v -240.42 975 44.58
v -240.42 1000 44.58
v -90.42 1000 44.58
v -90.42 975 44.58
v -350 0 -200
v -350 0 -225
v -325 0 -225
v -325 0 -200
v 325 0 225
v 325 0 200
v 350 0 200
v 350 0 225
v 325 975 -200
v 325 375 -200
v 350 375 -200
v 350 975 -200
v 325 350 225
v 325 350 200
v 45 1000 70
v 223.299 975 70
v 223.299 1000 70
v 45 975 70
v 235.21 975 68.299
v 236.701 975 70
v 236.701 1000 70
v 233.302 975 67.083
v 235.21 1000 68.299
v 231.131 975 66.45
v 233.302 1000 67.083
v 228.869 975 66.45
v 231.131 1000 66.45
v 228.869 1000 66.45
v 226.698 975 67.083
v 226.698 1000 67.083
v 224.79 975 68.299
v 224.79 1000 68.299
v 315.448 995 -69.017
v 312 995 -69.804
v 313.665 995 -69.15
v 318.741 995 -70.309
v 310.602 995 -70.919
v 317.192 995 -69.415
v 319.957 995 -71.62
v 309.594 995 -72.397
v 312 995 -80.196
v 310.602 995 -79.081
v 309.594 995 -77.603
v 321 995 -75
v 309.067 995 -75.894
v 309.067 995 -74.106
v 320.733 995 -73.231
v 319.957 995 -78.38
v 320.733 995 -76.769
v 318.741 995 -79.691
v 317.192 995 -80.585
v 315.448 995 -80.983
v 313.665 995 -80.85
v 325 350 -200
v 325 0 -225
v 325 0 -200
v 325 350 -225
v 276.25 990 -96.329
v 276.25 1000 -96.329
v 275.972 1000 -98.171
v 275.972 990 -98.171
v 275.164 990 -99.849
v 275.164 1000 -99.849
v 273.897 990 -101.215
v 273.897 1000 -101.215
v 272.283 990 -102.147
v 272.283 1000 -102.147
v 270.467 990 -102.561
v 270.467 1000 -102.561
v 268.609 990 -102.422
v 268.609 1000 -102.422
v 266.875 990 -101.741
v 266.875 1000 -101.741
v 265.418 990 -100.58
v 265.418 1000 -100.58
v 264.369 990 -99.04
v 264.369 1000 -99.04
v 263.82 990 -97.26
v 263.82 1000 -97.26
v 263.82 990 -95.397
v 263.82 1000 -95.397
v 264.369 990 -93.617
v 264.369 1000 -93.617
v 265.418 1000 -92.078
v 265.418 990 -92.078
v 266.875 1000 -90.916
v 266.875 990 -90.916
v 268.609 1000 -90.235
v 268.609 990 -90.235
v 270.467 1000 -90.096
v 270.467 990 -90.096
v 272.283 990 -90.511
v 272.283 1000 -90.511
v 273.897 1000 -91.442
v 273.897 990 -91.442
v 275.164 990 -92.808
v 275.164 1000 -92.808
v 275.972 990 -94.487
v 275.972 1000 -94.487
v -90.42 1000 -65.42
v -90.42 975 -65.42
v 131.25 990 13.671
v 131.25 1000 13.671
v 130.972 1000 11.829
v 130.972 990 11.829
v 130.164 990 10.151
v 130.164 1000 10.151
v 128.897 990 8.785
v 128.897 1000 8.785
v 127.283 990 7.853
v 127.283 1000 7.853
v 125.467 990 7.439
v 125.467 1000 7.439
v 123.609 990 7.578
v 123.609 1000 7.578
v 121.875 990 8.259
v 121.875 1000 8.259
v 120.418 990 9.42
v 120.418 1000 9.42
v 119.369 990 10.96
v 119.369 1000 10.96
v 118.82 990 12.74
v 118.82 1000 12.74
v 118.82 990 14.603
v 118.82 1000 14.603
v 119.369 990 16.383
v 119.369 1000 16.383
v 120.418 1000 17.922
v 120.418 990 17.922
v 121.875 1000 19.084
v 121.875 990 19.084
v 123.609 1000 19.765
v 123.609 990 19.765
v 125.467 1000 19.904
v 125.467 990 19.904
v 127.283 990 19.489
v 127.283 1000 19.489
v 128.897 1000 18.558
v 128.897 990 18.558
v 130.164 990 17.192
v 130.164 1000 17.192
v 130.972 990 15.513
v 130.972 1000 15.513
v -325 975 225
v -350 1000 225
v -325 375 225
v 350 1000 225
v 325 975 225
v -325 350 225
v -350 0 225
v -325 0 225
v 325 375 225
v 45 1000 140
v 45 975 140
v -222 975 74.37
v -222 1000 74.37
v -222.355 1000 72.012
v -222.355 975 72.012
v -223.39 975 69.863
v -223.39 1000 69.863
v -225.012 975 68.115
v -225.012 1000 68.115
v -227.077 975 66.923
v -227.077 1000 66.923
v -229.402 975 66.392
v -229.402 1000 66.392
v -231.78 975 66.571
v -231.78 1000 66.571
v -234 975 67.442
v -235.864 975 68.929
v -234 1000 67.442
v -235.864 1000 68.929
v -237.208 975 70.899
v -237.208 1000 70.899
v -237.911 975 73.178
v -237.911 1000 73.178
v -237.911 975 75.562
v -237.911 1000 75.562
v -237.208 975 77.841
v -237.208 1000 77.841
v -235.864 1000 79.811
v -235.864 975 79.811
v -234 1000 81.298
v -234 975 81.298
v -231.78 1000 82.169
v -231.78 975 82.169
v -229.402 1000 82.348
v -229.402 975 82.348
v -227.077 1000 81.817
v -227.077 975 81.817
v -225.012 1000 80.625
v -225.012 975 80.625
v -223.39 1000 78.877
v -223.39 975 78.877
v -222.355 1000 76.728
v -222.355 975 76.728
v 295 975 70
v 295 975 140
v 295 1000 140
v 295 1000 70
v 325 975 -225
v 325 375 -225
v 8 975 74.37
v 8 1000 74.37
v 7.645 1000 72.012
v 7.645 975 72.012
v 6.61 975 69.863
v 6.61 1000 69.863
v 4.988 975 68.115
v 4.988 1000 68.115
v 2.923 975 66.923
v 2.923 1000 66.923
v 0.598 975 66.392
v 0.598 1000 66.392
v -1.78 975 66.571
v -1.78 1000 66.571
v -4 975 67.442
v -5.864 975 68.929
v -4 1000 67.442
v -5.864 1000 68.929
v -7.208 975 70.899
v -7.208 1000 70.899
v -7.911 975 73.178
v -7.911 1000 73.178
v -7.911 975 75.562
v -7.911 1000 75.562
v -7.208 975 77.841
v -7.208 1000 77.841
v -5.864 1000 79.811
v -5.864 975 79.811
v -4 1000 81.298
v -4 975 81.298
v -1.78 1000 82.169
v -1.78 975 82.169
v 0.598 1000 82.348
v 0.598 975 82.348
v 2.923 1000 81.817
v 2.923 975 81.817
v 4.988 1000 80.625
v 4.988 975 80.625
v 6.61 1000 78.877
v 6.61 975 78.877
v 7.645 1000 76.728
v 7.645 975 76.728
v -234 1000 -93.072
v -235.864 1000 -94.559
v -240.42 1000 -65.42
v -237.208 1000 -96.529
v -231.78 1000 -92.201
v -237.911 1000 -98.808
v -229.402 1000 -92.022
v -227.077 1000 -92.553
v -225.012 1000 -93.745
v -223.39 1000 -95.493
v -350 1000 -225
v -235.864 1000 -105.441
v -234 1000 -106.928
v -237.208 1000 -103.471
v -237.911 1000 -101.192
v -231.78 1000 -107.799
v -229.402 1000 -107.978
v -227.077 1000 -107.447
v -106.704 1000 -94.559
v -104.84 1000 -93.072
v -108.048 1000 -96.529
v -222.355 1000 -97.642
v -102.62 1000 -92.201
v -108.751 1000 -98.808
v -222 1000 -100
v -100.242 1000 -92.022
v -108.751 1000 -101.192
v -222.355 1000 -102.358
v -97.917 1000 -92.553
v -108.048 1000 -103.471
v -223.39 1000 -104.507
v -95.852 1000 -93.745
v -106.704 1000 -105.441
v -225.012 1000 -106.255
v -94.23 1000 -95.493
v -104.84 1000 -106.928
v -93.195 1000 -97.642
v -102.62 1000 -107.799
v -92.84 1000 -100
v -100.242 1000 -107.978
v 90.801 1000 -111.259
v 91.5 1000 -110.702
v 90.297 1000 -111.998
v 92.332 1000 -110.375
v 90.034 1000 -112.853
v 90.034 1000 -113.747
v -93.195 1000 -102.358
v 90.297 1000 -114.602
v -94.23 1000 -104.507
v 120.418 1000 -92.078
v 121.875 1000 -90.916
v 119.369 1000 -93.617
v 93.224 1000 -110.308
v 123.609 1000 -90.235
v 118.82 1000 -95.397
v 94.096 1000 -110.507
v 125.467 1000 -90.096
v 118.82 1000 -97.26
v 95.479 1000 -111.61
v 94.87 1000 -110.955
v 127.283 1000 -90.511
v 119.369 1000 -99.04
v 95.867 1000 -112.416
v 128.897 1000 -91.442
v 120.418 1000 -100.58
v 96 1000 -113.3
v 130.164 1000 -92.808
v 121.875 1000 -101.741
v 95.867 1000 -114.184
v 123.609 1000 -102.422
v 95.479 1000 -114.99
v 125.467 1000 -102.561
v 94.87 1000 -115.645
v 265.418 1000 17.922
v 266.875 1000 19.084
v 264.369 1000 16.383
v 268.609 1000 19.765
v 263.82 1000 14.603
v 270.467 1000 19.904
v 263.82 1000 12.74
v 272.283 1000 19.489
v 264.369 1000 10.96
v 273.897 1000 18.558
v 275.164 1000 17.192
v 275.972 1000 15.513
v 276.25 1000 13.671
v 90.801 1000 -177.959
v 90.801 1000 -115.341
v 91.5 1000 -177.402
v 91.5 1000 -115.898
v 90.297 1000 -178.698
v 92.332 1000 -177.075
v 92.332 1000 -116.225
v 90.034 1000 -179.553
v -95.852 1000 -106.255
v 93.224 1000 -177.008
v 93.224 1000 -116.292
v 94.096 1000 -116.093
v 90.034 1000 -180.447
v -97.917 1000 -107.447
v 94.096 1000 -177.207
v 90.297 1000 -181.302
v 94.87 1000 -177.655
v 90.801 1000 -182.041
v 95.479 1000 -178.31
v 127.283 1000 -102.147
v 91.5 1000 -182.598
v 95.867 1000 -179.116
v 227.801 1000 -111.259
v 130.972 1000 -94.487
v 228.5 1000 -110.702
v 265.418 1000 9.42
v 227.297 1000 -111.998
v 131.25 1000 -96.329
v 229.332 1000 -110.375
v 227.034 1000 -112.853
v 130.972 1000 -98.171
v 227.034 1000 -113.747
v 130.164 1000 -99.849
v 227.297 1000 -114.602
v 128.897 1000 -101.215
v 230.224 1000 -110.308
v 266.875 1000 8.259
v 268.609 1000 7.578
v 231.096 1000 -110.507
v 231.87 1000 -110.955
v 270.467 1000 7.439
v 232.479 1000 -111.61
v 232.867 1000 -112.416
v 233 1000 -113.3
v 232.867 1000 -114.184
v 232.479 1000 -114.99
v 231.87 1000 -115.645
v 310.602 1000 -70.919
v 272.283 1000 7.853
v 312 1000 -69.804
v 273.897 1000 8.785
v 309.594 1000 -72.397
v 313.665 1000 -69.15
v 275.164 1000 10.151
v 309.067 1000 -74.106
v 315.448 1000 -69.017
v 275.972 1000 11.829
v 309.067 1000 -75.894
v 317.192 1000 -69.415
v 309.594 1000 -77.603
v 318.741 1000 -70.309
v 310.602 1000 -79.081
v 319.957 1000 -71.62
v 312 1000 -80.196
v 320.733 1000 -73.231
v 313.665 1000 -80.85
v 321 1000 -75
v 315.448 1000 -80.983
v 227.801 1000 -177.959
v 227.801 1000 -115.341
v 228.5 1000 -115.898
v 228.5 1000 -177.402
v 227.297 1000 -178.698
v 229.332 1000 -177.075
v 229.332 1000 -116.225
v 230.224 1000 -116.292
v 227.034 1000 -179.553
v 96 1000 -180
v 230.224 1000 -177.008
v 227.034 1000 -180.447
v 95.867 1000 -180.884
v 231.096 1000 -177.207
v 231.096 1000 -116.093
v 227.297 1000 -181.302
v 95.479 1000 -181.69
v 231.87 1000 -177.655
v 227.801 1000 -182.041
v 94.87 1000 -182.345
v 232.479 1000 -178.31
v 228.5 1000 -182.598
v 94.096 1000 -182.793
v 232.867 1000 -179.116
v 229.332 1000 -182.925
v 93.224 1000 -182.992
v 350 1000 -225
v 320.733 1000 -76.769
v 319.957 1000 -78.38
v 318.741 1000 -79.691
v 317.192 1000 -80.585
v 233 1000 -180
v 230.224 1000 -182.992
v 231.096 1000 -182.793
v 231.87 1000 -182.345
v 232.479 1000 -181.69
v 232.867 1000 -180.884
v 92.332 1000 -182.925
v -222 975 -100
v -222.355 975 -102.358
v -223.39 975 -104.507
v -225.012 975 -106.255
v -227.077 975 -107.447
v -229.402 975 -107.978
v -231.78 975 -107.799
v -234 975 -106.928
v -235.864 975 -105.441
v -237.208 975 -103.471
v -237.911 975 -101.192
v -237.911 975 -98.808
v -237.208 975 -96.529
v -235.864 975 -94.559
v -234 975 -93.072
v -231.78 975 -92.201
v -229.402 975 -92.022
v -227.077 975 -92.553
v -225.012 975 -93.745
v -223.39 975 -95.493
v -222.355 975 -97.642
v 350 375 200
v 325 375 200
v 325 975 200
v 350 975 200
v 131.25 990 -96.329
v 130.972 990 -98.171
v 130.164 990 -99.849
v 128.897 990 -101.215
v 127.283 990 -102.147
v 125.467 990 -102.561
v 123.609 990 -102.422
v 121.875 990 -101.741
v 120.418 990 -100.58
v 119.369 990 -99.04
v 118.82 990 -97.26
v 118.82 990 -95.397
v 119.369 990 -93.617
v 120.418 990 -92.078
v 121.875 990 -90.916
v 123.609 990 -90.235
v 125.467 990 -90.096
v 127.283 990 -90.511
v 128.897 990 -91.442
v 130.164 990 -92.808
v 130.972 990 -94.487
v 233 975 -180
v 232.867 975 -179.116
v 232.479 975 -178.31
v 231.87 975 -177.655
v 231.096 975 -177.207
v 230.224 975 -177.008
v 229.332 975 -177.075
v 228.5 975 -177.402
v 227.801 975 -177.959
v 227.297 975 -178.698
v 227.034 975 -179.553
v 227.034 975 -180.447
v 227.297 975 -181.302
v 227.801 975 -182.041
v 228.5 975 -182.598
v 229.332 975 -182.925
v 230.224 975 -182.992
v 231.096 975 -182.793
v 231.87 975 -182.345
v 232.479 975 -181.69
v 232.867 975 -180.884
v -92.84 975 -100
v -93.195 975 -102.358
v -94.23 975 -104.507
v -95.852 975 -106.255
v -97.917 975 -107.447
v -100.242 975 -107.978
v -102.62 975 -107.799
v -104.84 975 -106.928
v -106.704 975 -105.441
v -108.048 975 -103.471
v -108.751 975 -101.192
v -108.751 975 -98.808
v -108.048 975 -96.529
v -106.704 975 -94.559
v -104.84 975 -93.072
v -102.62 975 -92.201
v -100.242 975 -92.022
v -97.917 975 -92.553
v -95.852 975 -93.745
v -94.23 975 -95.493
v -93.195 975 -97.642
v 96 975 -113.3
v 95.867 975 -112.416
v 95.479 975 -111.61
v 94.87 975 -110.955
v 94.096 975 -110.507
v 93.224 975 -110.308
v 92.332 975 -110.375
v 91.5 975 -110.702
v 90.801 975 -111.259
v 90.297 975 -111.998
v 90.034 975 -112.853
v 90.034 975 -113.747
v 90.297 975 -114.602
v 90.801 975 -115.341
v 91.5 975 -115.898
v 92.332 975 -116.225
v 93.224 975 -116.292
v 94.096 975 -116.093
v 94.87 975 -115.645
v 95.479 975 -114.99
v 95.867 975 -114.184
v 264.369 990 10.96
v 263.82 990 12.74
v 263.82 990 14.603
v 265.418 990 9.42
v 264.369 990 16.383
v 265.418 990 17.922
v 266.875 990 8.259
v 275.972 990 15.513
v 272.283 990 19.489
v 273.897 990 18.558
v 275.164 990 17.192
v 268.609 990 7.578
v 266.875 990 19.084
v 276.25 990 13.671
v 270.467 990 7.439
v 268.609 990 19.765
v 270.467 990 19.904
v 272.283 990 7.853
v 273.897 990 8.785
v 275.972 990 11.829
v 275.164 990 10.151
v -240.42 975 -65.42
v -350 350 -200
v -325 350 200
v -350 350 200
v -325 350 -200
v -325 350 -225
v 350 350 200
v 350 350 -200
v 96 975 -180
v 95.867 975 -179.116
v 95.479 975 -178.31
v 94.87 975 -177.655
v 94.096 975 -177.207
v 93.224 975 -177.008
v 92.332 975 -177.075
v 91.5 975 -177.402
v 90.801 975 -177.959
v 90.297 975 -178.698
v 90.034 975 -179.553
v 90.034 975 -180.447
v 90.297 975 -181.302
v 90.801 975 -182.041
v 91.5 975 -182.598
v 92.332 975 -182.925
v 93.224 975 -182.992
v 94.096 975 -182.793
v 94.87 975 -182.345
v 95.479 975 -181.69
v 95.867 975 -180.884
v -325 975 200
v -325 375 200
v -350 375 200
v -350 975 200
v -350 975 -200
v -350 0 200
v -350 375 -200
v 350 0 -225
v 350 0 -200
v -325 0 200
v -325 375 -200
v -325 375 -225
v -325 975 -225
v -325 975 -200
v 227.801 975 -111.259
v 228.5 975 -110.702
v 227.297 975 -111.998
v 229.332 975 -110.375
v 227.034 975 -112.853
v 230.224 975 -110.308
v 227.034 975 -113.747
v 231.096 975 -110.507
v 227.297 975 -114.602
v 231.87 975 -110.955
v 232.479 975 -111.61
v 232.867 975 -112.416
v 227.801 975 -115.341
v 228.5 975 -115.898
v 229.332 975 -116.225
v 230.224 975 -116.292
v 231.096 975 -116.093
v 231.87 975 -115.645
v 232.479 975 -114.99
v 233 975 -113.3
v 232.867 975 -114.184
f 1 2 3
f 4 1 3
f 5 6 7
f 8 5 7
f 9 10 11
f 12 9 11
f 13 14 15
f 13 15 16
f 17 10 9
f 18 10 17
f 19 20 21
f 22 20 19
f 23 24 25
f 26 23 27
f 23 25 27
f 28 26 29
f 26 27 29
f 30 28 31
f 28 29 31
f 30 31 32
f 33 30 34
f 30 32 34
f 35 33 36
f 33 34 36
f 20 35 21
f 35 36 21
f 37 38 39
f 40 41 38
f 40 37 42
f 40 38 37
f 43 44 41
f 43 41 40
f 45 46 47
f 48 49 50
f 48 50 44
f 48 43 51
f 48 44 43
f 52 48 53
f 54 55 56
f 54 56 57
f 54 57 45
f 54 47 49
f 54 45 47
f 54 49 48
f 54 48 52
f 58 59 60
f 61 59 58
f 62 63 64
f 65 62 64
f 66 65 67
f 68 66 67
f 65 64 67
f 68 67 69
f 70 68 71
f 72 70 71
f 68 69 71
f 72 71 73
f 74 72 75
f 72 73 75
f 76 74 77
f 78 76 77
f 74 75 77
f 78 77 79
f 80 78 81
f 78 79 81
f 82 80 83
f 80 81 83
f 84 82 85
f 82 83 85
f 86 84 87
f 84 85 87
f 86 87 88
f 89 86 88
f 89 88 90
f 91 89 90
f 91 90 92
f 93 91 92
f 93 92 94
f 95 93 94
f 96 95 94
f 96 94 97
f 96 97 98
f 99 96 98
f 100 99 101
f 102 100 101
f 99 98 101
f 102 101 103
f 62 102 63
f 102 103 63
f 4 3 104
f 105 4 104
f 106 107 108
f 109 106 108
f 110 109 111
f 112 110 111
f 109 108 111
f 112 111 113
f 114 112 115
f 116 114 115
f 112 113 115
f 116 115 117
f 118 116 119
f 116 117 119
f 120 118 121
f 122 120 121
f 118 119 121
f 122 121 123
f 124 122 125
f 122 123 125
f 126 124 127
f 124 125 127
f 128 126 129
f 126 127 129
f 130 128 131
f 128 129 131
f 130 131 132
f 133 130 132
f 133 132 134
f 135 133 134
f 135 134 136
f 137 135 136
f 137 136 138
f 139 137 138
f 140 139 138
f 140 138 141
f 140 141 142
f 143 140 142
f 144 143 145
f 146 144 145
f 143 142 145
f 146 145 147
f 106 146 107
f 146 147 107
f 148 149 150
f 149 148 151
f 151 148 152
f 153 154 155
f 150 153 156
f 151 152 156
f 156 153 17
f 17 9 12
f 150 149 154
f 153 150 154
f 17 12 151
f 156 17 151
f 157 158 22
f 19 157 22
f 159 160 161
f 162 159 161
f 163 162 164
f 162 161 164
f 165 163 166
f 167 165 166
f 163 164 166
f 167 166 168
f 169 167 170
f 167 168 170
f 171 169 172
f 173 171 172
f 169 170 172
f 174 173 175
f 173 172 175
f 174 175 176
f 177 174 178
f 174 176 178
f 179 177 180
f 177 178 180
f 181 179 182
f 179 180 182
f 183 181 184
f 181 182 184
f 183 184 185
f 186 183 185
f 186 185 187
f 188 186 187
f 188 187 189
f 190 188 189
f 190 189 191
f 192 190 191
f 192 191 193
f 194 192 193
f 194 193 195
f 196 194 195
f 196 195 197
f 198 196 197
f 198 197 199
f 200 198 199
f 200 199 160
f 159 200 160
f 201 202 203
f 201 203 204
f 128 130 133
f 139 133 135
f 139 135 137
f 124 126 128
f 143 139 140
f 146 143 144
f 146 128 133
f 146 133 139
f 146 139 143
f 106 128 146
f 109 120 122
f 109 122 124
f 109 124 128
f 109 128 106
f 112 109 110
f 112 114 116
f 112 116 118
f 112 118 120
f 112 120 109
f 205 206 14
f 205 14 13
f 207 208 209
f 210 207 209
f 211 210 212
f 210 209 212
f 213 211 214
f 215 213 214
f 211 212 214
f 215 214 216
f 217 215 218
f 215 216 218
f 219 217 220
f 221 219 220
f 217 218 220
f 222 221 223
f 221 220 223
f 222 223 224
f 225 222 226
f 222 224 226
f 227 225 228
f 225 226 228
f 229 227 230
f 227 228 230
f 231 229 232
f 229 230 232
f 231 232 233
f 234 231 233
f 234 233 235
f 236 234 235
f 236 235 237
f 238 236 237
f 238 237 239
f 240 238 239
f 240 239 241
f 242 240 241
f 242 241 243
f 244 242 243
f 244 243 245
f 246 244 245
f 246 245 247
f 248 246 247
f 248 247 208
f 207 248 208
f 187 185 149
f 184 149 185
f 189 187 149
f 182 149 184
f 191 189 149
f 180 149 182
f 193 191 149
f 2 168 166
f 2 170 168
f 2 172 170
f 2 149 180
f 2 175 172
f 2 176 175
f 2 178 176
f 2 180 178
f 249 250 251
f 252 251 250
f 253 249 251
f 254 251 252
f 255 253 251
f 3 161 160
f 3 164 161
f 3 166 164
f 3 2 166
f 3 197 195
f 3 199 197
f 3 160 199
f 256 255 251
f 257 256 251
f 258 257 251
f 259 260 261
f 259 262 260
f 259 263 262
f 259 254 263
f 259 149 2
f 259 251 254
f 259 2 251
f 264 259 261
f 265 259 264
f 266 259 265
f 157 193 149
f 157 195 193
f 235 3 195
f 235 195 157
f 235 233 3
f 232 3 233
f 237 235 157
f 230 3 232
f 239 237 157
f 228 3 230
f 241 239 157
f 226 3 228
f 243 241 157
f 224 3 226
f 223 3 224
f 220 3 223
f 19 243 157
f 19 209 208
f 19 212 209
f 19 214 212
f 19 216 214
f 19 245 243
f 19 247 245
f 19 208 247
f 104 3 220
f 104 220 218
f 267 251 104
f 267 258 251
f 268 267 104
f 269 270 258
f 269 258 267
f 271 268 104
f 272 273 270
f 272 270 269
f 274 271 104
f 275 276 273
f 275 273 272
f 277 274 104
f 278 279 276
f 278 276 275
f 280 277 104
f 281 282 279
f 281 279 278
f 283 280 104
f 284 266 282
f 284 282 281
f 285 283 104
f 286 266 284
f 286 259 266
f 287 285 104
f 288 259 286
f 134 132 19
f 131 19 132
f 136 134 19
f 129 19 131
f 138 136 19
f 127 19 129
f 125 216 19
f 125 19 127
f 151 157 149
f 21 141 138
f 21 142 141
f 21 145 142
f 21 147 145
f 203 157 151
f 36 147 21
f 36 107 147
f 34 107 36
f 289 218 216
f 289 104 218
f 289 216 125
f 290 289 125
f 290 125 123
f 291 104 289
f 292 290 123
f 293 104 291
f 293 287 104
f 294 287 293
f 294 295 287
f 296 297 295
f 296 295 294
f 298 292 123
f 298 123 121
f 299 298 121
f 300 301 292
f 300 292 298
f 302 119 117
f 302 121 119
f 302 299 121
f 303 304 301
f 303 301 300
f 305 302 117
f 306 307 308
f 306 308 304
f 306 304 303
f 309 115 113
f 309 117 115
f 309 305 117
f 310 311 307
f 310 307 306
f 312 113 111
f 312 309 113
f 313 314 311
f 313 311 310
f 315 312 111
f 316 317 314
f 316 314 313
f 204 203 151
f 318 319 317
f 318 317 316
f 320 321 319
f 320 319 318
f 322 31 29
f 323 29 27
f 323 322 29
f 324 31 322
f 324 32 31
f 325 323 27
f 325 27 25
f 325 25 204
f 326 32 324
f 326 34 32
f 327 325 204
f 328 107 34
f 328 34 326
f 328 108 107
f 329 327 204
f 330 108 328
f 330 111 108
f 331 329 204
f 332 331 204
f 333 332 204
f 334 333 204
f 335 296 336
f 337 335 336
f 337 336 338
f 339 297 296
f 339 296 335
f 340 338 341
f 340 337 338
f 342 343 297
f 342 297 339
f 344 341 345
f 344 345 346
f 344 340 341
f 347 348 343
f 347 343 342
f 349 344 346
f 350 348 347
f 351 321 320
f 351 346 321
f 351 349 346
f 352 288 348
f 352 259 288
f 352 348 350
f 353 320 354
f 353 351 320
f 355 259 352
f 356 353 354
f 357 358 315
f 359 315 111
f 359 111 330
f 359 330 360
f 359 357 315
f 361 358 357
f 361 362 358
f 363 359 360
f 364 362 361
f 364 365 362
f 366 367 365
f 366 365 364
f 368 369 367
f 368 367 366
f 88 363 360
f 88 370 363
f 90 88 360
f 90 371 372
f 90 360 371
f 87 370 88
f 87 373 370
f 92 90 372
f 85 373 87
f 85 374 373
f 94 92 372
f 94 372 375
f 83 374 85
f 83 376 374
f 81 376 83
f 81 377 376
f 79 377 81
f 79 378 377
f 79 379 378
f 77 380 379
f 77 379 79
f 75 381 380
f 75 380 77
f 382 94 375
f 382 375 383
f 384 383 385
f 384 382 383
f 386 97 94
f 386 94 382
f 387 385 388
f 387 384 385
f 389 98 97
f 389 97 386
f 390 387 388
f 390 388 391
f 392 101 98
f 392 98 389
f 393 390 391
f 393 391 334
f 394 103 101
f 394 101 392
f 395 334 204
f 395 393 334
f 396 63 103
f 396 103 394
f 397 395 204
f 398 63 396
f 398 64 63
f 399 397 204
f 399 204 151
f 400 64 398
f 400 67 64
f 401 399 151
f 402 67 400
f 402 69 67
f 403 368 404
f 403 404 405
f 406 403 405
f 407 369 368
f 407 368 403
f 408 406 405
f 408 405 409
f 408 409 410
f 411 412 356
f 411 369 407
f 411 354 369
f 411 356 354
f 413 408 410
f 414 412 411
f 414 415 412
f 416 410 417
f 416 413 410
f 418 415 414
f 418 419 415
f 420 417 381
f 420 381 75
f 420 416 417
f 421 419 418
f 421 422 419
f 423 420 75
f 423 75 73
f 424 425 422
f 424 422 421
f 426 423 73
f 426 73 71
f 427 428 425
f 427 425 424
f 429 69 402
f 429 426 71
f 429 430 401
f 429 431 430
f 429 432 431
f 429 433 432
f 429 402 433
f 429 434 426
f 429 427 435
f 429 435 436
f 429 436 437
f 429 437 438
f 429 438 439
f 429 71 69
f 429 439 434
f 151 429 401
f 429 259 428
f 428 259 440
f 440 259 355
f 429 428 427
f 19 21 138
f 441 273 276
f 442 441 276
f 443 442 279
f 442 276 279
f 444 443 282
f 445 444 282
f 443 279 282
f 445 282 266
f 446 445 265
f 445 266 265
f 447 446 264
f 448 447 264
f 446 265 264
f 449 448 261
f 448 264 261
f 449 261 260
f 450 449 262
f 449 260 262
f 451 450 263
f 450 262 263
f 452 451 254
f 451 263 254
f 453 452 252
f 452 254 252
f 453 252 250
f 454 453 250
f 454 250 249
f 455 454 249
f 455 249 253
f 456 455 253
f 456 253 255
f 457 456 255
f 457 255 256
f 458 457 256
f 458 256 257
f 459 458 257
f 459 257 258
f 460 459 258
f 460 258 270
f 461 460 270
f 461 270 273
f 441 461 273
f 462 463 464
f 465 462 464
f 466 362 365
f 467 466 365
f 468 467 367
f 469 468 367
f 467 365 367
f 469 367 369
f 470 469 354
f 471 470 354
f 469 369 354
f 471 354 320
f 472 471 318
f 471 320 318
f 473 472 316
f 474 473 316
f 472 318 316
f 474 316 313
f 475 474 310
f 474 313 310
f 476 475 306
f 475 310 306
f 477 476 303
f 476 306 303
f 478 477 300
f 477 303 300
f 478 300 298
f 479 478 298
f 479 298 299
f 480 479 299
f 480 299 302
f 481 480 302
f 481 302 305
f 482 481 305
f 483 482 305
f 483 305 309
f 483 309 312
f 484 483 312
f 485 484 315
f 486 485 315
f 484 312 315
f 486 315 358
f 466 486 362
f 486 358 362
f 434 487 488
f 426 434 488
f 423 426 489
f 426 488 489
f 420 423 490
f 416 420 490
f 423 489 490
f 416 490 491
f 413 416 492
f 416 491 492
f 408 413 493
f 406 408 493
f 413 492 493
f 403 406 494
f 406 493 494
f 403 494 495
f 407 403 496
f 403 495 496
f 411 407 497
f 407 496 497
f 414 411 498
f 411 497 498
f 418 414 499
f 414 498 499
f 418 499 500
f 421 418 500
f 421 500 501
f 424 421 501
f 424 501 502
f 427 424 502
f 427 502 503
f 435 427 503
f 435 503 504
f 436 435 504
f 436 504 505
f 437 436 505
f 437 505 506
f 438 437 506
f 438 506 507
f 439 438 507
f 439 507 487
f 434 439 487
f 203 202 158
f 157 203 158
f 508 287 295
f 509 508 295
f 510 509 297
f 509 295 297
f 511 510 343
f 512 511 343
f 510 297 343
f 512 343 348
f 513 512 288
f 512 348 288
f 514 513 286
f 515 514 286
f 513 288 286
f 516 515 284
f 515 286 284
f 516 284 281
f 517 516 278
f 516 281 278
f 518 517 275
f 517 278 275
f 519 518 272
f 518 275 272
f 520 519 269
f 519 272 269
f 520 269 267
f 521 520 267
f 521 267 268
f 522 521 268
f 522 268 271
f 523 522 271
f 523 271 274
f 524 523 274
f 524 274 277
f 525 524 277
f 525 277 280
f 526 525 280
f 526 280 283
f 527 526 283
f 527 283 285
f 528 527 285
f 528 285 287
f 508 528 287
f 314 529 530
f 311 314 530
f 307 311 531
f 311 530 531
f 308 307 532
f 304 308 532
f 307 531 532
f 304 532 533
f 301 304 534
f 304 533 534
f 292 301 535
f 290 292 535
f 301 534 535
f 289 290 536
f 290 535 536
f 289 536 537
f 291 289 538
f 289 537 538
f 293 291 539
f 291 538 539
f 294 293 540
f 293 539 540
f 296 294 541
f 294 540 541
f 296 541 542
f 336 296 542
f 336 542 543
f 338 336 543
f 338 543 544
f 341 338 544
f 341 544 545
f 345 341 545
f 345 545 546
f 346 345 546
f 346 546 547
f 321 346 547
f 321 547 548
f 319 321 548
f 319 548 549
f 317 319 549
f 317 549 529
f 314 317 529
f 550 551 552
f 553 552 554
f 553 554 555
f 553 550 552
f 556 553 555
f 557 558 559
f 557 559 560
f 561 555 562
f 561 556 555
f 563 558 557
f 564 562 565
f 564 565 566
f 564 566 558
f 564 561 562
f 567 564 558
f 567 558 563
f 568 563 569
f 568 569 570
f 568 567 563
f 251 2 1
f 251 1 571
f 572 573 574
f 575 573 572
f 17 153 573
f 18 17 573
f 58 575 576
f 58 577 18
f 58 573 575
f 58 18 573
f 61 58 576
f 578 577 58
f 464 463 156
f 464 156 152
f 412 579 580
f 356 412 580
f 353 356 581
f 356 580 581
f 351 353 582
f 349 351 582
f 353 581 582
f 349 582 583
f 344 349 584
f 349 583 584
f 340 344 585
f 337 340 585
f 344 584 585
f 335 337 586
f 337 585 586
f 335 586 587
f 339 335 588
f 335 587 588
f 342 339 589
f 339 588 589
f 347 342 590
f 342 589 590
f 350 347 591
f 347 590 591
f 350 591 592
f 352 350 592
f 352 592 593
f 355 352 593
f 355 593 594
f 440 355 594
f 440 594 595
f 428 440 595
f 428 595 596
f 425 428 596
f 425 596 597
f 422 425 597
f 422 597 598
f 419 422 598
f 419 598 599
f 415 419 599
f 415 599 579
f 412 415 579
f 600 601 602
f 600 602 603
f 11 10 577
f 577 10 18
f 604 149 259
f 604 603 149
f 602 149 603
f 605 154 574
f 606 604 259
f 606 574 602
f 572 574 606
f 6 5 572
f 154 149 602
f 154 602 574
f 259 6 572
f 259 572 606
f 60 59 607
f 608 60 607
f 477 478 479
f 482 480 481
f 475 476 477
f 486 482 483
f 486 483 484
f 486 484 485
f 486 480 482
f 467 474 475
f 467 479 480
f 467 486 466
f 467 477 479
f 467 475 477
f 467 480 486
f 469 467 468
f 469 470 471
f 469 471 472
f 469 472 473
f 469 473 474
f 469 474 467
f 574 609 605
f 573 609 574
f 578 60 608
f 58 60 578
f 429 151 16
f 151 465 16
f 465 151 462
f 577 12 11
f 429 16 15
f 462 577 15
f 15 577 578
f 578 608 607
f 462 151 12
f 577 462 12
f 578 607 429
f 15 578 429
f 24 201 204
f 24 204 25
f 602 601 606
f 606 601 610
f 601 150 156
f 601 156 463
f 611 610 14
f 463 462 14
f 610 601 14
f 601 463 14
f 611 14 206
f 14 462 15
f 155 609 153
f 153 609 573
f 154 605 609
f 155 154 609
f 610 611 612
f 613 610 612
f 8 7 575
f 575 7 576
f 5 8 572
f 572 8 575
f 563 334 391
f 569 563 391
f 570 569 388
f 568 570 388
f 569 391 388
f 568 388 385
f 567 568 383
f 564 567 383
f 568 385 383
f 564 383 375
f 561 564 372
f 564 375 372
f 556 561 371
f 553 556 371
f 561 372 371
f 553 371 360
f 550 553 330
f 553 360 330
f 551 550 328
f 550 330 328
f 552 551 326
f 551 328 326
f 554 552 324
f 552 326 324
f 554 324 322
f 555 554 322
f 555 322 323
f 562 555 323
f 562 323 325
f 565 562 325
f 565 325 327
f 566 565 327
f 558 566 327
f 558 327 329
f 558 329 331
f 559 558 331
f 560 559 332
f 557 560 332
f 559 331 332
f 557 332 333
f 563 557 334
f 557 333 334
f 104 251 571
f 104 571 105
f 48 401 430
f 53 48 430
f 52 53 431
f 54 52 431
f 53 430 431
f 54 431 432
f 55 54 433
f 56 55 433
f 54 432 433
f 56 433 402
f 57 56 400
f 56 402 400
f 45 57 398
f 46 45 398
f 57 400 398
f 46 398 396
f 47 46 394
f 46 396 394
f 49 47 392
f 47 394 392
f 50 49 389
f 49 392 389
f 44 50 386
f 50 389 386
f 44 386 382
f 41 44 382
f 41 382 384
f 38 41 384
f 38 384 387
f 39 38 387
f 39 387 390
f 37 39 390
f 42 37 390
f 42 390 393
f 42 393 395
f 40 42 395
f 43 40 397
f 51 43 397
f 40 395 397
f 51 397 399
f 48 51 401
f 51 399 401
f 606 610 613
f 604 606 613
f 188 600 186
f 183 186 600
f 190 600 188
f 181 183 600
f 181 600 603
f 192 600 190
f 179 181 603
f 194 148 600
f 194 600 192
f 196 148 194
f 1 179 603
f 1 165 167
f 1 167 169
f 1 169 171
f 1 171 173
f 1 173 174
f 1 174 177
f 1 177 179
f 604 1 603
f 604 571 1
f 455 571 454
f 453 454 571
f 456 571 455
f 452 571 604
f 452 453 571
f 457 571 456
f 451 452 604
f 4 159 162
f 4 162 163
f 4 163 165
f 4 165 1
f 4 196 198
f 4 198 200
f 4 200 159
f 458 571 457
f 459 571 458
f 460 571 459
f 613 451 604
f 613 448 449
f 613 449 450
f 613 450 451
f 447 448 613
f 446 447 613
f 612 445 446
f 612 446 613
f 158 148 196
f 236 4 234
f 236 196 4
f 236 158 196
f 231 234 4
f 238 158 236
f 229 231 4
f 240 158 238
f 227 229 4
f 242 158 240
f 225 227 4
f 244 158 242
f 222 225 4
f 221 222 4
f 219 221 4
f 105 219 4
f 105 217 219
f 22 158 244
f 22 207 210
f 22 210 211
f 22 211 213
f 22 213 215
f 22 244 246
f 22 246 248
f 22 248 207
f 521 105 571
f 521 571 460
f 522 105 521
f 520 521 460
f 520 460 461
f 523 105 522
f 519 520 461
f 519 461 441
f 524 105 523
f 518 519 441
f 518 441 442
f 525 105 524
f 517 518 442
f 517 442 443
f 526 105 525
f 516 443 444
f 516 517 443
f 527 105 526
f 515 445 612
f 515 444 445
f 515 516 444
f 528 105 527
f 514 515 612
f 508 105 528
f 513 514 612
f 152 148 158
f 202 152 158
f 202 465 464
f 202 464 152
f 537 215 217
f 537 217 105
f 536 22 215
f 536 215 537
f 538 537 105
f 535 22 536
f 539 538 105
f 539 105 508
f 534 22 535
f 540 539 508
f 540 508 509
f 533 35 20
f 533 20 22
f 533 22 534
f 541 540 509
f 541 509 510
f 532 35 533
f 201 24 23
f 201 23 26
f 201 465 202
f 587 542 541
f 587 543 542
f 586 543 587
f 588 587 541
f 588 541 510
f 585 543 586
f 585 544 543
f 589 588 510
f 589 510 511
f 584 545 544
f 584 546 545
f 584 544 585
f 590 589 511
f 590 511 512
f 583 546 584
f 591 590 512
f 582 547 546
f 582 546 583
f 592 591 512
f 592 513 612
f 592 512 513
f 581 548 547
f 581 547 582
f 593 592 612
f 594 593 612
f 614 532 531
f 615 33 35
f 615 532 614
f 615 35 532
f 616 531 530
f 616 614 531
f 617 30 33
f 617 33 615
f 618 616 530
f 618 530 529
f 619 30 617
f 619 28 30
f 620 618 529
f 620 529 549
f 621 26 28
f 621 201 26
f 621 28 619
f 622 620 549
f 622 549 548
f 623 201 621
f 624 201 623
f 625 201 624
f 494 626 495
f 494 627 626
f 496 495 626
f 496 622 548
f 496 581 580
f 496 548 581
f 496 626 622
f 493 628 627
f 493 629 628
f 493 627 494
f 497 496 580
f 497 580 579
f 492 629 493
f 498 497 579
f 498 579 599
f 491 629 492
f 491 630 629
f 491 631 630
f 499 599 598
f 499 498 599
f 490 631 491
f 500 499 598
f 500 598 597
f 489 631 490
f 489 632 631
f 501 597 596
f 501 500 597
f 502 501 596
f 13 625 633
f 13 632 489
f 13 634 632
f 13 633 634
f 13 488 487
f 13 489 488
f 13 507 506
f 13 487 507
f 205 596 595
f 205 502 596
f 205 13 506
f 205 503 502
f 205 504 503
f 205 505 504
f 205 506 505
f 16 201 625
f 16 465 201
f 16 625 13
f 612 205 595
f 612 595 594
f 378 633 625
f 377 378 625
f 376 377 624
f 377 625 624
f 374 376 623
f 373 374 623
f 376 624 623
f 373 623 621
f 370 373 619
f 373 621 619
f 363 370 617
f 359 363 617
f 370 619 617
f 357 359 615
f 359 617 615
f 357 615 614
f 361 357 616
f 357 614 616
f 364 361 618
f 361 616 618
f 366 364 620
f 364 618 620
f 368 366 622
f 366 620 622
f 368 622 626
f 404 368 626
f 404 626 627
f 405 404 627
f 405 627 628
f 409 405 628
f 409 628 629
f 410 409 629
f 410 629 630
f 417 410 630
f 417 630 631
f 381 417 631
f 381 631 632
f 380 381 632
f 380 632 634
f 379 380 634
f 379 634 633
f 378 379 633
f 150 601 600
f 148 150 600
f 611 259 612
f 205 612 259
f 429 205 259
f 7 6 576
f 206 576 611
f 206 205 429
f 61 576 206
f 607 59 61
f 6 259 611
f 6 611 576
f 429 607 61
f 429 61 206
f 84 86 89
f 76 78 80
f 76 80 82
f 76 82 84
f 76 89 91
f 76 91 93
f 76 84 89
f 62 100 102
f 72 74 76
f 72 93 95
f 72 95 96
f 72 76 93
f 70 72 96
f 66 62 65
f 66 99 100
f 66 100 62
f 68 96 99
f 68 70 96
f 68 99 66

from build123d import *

# Parameters (mm, degrees)
SKETCH1_W               = 700
SKETCH1_H               = 450
BOSS_EXTRUDE1_DEPTH     = 1000
SKETCH2_W               = 650
SKETCH2_H               = 600
CUT_EXTRUDE1_DEPTH      = 250
CUT_EXTRUDE1_DEPTH_BACK = 250
SKETCH3_W               = 650
SKETCH3_H               = 350
CUT_EXTRUDE2_DEPTH      = 250
CUT_EXTRUDE2_DEPTH_BACK = 250
SKETCH4_W               = 400
SKETCH4_H               = 600
CUT_EXTRUDE3_DEPTH      = 400
CUT_EXTRUDE3_DEPTH_BACK = 400
SKETCH5_W               = 400
SKETCH5_H               = 350
CUT_EXTRUDE4_DEPTH      = 400
CUT_EXTRUDE4_DEPTH_BACK = 400
ESBO_O1_R               = 8
ESBO_O1_W               = 150
ESBO_O1_H               = 110
CORTE_EXTRUS_O1_DEPTH   = 50
ESBO_O2_W               = 250
ESBO_O2_H               = 70
CORTE_EXTRUS_O2_DEPTH   = 26
ESBO_O3_R               = 6.25
CORTE_EXTRUS_O3_DEPTH   = 10
ESBO_O5_R               = 3
CORTE_EXTRUS_O4_DEPTH   = 26
ESBO_O7_R               = 6
CORTE_EXTRUS_O5_DEPTH   = 5


with BuildPart() as part:
    # Sketch1 → Boss-Extrude1 (new body)
    with BuildSketch(Plane(origin=(0, 0, 0), x_dir=(1, 0, 0), z_dir=(0, 1, 0))):
        Rectangle(SKETCH1_W, SKETCH1_H)
    extrude(amount=BOSS_EXTRUDE1_DEPTH)

    # Sketch2 → Cut-Extrude1 (cut, two sides)
    with BuildSketch(Plane.XY) as cut_extrude1_sk:
        with Locations((0, 675)):
            Rectangle(SKETCH2_W, SKETCH2_H)
    extrude(amount=CUT_EXTRUDE1_DEPTH, mode=Mode.SUBTRACT)
    extrude(cut_extrude1_sk.sketch, amount=-CUT_EXTRUDE1_DEPTH_BACK, mode=Mode.SUBTRACT)

    # Sketch3 → Cut-Extrude2 (cut, two sides)
    with BuildSketch(Plane.XY) as cut_extrude2_sk:
        with Locations((0, 175)):
            Rectangle(SKETCH3_W, SKETCH3_H)
    extrude(amount=CUT_EXTRUDE2_DEPTH, mode=Mode.SUBTRACT)
    extrude(cut_extrude2_sk.sketch, amount=-CUT_EXTRUDE2_DEPTH_BACK, mode=Mode.SUBTRACT)

    # Sketch4 → Cut-Extrude3 (cut, two sides)
    with BuildSketch(Plane(origin=(0, 0, 0), x_dir=(0, 0, -1), z_dir=(1, 0, 0))) as cut_extrude3_sk:
        with Locations((0, 675)):
            Rectangle(SKETCH4_W, SKETCH4_H)
    extrude(amount=CUT_EXTRUDE3_DEPTH, mode=Mode.SUBTRACT)
    extrude(cut_extrude3_sk.sketch, amount=-CUT_EXTRUDE3_DEPTH_BACK, mode=Mode.SUBTRACT)

    # Sketch5 → Cut-Extrude4 (cut, two sides)
    with BuildSketch(Plane(origin=(0, 0, 0), x_dir=(0, 0, -1), z_dir=(1, 0, 0))) as cut_extrude4_sk:
        with Locations((0, 175)):
            Rectangle(SKETCH5_W, SKETCH5_H)
    extrude(amount=CUT_EXTRUDE4_DEPTH, mode=Mode.SUBTRACT)
    extrude(cut_extrude4_sk.sketch, amount=-CUT_EXTRUDE4_DEPTH_BACK, mode=Mode.SUBTRACT)

    # Esboço1 → Corte-extrusão1 (cut)
    with BuildSketch(Plane(origin=(0, 1000, 0), x_dir=(1, 0, 0), z_dir=(0, 1, 0))):
        with Locations((-100.84, 100)):
            Circle(ESBO_O1_R)
        with Locations((-230, 100)):
            Circle(ESBO_O1_R)
        with Locations((-230, -74.37)):
            Circle(ESBO_O1_R)
        with Locations((0, -74.37)):
            Circle(ESBO_O1_R)
        with Locations((230, -74.37)):
            Circle(ESBO_O1_R)
        with Locations((-165.42, 10.42)):
            Rectangle(ESBO_O1_W, ESBO_O1_H)
    extrude(amount=-CORTE_EXTRUS_O1_DEPTH, mode=Mode.SUBTRACT)

    # Esboço2 → Corte-extrusão2 (cut, through all)
    with BuildSketch(Plane(origin=(0, 975, 0), x_dir=(-1, 0, 0), z_dir=(0, -1, 0))):
        with Locations((-170, -105)):
            Rectangle(ESBO_O2_W, ESBO_O2_H)
    extrude(amount=-CORTE_EXTRUS_O2_DEPTH, mode=Mode.SUBTRACT)

    # Esboço3 → Corte-extrusão3 (cut)
    with BuildSketch(Plane(origin=(0, 1000, 0), x_dir=(1, 0, 0), z_dir=(0, 1, 0))):
        with Locations((270, -13.671274916)):
            Circle(ESBO_O3_R)
        with Locations((270, 96.328725084)):
            Circle(ESBO_O3_R)
        with Locations((125, 96.328725084)):
            Circle(ESBO_O3_R)
        with Locations((125, -13.671274916)):
            Circle(ESBO_O3_R)
    extrude(amount=-CORTE_EXTRUS_O3_DEPTH, mode=Mode.SUBTRACT)

    # Esboço5 → Corte-extrusão4 (cut, through all)
    with BuildSketch(Plane.XZ.offset(-975)):
        with Locations((93, -180)):
            Circle(ESBO_O5_R)
        with Locations((93, -113.3)):
            Circle(ESBO_O5_R)
        with Locations((230, -113.3)):
            Circle(ESBO_O5_R)
        with Locations((230, -180)):
            Circle(ESBO_O5_R)
    extrude(amount=-CORTE_EXTRUS_O4_DEPTH, mode=Mode.SUBTRACT)

    # Esboço7 → Corte-extrusão5 (cut)
    with BuildSketch(Plane(origin=(0, 1000, 0), x_dir=(1, 0, 0), z_dir=(0, 1, 0))):
        with Locations((315, 75)):
            Circle(ESBO_O7_R)
    extrude(amount=-CORTE_EXTRUS_O5_DEPTH, mode=Mode.SUBTRACT)


solid = part.part
